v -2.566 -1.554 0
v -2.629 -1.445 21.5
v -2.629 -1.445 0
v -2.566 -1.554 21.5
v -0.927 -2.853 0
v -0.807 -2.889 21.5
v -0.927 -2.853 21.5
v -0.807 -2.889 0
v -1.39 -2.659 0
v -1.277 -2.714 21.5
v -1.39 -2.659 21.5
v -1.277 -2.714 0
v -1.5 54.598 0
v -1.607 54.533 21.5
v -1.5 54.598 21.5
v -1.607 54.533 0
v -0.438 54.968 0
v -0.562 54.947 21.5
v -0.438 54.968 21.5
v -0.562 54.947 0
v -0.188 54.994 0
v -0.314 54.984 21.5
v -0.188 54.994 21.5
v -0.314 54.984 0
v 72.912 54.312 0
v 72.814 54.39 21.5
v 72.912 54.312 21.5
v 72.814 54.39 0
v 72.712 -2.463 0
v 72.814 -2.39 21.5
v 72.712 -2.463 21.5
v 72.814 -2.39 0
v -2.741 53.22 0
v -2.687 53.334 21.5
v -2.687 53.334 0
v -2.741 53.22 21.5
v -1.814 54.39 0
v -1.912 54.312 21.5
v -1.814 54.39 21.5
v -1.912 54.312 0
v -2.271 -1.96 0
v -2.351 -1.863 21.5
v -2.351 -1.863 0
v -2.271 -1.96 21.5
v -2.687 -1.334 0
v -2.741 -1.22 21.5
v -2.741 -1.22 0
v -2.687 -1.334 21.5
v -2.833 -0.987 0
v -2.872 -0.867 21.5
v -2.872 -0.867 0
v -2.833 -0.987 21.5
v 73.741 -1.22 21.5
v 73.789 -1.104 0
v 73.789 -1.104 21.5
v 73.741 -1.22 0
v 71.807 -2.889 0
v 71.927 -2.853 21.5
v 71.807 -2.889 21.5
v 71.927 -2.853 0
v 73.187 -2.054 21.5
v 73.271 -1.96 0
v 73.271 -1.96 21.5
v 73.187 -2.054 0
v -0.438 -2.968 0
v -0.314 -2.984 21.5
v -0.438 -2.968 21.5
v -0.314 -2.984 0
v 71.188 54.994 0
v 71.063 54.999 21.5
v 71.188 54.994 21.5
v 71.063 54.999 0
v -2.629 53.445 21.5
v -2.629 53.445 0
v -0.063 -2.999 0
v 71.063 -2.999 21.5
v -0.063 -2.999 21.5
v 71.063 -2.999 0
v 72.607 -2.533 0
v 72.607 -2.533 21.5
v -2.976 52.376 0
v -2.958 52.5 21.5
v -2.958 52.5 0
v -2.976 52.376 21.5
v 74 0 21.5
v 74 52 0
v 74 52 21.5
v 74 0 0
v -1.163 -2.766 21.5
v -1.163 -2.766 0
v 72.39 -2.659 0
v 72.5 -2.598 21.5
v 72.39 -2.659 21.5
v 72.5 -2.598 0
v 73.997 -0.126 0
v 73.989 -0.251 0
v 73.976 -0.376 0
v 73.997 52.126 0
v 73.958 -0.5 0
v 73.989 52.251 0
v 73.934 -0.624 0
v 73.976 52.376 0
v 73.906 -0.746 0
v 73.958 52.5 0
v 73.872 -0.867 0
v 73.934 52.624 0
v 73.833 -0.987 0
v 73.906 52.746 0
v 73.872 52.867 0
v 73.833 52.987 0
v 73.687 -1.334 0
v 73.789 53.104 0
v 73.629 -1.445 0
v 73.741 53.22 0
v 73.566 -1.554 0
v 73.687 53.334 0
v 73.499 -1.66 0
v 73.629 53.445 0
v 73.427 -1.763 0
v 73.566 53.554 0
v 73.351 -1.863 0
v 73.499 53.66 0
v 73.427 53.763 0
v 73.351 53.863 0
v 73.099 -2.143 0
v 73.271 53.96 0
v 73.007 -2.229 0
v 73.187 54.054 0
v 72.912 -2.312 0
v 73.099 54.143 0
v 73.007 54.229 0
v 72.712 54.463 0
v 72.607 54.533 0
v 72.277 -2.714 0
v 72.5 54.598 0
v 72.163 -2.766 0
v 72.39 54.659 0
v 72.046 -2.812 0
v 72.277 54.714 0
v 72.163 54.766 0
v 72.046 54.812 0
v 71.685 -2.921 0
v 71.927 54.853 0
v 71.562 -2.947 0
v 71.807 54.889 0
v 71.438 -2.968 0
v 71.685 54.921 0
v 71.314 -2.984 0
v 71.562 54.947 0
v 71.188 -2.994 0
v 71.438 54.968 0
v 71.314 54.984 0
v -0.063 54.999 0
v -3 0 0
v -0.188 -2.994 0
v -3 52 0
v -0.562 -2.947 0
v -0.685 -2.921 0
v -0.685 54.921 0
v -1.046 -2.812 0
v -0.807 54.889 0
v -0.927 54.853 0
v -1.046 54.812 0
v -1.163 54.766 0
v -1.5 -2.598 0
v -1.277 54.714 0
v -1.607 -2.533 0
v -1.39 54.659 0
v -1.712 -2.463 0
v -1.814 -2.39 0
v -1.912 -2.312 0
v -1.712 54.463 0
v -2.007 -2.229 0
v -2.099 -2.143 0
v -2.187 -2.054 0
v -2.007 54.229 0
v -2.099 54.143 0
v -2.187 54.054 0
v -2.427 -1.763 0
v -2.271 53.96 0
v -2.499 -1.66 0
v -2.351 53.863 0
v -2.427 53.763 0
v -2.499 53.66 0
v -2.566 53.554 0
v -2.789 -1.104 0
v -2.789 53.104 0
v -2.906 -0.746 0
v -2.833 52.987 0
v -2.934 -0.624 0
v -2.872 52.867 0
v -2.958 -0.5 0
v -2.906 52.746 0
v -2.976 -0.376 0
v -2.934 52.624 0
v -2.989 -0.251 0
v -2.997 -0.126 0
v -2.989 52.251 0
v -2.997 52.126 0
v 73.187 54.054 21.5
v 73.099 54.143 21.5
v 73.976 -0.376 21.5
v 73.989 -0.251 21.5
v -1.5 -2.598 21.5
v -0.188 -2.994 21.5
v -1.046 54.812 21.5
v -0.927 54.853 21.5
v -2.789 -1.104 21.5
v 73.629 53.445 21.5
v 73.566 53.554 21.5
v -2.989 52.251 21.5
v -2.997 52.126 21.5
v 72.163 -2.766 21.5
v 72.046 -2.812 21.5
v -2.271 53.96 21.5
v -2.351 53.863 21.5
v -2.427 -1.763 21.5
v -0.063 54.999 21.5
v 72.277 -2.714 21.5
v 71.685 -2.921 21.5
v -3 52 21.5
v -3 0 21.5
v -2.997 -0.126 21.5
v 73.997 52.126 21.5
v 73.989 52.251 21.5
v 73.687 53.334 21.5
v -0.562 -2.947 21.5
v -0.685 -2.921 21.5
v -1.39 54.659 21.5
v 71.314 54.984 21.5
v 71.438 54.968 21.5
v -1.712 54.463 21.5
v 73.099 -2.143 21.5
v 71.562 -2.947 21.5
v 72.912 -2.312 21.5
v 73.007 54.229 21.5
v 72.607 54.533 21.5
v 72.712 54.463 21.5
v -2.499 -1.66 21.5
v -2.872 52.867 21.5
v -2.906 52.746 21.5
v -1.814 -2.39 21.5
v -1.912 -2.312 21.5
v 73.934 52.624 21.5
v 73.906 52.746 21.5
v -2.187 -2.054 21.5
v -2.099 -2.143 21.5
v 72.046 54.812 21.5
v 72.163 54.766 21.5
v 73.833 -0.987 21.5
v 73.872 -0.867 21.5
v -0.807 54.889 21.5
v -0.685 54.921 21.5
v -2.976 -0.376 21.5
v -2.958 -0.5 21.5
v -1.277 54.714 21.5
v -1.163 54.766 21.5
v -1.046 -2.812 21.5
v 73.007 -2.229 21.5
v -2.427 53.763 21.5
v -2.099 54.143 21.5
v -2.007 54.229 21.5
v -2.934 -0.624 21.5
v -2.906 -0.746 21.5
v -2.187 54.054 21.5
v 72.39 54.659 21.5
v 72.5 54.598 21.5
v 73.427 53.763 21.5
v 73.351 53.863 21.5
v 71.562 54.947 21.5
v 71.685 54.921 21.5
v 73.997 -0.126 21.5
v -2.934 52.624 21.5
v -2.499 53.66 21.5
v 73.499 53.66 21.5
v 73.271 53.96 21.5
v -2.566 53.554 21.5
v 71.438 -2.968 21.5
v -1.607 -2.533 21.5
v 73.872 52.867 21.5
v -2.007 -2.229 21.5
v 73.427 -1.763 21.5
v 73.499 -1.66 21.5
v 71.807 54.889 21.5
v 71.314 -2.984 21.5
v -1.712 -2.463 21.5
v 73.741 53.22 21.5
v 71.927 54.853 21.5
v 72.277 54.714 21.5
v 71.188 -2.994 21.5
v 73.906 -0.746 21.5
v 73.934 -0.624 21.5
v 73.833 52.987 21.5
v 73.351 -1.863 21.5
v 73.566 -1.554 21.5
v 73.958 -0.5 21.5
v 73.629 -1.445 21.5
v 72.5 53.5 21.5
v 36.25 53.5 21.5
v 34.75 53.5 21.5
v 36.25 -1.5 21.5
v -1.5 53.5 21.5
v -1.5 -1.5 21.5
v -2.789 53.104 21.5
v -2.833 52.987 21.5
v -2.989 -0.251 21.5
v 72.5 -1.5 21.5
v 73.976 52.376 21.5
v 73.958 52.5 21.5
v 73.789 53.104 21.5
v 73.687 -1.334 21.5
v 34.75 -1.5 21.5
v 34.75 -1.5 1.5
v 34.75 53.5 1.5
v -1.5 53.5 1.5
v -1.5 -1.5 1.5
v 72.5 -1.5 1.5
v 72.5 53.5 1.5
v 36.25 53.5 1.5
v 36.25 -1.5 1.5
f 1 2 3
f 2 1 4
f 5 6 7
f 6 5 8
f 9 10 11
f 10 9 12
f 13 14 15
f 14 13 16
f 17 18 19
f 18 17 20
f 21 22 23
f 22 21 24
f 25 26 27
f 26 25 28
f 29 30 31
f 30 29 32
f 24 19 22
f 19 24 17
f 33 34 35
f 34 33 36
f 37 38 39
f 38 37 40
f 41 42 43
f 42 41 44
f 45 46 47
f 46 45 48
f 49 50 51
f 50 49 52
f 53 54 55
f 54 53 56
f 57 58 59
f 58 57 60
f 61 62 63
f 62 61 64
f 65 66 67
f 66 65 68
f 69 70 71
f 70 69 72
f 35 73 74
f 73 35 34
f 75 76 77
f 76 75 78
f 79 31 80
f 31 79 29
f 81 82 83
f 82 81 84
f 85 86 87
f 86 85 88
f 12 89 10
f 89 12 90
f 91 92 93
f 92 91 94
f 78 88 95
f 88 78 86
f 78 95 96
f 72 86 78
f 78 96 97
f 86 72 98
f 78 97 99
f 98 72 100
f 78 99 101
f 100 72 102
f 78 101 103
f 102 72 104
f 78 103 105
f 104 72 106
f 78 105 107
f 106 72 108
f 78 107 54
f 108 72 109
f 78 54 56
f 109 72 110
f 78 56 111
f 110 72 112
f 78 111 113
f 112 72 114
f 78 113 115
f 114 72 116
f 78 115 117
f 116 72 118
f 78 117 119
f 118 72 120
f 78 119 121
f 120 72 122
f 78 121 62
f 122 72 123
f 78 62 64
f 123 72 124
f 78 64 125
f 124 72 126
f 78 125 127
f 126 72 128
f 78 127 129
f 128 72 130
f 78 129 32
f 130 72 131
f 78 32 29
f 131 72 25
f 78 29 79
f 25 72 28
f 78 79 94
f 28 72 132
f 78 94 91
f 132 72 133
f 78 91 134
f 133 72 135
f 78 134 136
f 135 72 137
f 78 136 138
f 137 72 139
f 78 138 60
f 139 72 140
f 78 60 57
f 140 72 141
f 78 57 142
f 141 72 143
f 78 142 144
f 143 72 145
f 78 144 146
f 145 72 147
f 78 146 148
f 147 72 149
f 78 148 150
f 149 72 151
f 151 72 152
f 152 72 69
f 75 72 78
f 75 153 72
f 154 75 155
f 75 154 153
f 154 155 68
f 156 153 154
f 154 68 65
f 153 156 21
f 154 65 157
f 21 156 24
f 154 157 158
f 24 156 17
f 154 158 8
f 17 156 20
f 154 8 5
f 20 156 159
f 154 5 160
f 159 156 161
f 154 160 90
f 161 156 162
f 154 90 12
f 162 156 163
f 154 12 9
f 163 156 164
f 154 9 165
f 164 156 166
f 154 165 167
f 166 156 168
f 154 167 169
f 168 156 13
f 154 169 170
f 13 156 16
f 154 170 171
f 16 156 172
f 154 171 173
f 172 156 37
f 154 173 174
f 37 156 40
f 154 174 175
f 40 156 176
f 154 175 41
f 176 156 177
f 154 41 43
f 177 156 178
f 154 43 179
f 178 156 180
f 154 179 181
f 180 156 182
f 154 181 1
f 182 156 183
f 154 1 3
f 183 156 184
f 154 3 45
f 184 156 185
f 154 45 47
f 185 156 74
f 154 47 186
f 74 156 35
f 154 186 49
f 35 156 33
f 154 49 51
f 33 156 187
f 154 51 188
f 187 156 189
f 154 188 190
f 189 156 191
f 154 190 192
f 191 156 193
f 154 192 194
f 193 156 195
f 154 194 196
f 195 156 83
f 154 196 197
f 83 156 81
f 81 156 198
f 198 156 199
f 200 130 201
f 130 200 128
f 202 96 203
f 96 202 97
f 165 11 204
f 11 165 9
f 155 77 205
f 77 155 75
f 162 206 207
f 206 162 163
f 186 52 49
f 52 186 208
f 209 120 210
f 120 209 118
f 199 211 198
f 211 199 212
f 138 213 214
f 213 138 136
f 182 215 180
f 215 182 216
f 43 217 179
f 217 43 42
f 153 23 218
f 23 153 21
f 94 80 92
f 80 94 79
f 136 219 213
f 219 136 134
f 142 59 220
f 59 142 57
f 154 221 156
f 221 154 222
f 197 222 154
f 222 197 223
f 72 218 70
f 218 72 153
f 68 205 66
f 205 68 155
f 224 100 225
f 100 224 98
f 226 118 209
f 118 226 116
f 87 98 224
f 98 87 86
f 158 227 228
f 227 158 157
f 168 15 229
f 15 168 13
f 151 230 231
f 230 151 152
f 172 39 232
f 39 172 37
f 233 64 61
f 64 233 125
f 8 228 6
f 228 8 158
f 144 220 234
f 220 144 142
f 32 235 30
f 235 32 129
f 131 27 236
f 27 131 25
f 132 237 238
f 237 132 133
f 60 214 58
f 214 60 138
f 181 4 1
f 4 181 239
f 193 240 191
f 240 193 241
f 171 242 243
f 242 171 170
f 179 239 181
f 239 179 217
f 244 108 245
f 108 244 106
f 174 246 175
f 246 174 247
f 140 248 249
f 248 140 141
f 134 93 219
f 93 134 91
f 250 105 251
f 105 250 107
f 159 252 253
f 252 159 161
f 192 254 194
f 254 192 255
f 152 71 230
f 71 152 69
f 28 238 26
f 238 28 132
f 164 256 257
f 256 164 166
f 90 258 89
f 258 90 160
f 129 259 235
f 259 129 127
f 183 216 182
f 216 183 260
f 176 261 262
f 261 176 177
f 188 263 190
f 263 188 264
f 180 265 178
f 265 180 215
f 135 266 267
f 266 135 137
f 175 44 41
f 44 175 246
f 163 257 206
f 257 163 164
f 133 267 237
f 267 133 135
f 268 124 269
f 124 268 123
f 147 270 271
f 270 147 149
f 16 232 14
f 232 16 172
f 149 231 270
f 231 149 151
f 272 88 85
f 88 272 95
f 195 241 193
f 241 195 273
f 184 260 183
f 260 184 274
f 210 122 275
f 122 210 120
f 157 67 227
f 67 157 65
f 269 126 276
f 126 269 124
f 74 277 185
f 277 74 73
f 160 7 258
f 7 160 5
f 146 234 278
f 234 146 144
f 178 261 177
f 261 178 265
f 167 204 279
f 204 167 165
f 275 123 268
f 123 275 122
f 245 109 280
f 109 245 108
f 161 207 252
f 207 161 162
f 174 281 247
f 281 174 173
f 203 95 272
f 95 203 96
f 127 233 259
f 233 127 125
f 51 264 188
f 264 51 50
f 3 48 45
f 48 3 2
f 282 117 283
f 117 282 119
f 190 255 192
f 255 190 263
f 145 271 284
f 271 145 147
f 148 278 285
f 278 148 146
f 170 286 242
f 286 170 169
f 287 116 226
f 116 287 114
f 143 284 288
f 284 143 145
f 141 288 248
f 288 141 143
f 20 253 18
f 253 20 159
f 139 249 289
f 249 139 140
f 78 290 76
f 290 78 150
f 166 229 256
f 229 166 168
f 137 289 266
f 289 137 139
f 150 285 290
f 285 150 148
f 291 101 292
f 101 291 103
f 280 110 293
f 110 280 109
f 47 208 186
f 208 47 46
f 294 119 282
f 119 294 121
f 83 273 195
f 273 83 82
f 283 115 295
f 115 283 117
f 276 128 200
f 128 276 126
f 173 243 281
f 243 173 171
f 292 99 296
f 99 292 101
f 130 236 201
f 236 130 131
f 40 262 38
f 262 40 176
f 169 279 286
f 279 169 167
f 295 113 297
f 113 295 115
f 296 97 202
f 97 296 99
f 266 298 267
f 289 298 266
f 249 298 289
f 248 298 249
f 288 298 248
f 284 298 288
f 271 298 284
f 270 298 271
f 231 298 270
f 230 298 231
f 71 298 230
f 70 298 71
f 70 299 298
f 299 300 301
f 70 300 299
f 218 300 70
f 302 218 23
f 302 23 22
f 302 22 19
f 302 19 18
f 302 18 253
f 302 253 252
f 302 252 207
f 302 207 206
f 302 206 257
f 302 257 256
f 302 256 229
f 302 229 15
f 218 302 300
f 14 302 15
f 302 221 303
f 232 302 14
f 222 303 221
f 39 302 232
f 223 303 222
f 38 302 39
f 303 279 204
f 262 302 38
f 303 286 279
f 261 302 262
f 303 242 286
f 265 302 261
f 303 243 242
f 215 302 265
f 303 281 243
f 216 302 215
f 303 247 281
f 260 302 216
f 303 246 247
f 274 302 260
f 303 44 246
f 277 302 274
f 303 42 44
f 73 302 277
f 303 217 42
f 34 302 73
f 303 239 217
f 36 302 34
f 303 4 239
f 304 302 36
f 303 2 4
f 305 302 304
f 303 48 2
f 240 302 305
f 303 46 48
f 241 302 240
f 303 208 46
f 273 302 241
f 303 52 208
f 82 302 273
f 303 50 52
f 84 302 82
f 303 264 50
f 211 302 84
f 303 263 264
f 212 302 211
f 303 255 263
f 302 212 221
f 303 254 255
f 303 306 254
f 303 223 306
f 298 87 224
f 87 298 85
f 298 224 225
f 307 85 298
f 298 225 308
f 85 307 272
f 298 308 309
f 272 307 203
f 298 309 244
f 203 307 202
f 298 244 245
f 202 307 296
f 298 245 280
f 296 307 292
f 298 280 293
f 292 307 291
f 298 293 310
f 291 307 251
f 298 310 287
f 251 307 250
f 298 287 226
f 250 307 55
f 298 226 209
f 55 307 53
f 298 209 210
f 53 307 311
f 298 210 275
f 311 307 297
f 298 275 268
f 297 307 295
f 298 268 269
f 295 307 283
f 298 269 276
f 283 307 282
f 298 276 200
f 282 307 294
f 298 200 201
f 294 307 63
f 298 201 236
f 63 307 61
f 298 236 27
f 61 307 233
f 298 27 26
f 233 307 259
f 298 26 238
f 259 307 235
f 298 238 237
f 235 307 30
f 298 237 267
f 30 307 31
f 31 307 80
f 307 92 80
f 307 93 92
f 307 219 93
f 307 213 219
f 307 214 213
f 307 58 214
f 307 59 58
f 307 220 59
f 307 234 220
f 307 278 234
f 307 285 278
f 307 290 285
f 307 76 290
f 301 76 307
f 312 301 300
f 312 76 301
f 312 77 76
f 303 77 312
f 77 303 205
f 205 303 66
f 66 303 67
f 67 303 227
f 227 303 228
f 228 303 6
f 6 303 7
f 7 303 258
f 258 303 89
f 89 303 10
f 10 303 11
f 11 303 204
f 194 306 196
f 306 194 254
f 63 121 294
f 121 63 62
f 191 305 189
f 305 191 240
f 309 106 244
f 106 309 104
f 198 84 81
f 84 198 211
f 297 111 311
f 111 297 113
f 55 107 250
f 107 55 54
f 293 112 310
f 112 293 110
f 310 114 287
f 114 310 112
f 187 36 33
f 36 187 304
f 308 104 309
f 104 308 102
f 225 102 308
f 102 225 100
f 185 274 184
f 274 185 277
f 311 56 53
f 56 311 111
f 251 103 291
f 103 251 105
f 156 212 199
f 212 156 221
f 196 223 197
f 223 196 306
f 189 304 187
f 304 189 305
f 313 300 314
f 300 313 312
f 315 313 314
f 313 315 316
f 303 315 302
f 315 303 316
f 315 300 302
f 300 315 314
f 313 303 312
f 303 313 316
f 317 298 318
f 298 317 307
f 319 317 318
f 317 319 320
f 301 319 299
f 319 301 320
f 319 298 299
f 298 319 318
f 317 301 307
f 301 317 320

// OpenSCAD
$fn = 150;

difference() {
	minkowski() {
		cylinder(h = 1e-05, r = 3);
		cube(size = [71.0, 52.0, 21.5]);
	}
	translate(v = [-1.5, -1.5, 1.5]) {
		cube(size = [36.25, 55.0, 23.0]);
	}
	translate(v = [36.25, -1.5, 1.5]) {
		cube(size = [36.25, 55.0, 23.0]);
	}
}
